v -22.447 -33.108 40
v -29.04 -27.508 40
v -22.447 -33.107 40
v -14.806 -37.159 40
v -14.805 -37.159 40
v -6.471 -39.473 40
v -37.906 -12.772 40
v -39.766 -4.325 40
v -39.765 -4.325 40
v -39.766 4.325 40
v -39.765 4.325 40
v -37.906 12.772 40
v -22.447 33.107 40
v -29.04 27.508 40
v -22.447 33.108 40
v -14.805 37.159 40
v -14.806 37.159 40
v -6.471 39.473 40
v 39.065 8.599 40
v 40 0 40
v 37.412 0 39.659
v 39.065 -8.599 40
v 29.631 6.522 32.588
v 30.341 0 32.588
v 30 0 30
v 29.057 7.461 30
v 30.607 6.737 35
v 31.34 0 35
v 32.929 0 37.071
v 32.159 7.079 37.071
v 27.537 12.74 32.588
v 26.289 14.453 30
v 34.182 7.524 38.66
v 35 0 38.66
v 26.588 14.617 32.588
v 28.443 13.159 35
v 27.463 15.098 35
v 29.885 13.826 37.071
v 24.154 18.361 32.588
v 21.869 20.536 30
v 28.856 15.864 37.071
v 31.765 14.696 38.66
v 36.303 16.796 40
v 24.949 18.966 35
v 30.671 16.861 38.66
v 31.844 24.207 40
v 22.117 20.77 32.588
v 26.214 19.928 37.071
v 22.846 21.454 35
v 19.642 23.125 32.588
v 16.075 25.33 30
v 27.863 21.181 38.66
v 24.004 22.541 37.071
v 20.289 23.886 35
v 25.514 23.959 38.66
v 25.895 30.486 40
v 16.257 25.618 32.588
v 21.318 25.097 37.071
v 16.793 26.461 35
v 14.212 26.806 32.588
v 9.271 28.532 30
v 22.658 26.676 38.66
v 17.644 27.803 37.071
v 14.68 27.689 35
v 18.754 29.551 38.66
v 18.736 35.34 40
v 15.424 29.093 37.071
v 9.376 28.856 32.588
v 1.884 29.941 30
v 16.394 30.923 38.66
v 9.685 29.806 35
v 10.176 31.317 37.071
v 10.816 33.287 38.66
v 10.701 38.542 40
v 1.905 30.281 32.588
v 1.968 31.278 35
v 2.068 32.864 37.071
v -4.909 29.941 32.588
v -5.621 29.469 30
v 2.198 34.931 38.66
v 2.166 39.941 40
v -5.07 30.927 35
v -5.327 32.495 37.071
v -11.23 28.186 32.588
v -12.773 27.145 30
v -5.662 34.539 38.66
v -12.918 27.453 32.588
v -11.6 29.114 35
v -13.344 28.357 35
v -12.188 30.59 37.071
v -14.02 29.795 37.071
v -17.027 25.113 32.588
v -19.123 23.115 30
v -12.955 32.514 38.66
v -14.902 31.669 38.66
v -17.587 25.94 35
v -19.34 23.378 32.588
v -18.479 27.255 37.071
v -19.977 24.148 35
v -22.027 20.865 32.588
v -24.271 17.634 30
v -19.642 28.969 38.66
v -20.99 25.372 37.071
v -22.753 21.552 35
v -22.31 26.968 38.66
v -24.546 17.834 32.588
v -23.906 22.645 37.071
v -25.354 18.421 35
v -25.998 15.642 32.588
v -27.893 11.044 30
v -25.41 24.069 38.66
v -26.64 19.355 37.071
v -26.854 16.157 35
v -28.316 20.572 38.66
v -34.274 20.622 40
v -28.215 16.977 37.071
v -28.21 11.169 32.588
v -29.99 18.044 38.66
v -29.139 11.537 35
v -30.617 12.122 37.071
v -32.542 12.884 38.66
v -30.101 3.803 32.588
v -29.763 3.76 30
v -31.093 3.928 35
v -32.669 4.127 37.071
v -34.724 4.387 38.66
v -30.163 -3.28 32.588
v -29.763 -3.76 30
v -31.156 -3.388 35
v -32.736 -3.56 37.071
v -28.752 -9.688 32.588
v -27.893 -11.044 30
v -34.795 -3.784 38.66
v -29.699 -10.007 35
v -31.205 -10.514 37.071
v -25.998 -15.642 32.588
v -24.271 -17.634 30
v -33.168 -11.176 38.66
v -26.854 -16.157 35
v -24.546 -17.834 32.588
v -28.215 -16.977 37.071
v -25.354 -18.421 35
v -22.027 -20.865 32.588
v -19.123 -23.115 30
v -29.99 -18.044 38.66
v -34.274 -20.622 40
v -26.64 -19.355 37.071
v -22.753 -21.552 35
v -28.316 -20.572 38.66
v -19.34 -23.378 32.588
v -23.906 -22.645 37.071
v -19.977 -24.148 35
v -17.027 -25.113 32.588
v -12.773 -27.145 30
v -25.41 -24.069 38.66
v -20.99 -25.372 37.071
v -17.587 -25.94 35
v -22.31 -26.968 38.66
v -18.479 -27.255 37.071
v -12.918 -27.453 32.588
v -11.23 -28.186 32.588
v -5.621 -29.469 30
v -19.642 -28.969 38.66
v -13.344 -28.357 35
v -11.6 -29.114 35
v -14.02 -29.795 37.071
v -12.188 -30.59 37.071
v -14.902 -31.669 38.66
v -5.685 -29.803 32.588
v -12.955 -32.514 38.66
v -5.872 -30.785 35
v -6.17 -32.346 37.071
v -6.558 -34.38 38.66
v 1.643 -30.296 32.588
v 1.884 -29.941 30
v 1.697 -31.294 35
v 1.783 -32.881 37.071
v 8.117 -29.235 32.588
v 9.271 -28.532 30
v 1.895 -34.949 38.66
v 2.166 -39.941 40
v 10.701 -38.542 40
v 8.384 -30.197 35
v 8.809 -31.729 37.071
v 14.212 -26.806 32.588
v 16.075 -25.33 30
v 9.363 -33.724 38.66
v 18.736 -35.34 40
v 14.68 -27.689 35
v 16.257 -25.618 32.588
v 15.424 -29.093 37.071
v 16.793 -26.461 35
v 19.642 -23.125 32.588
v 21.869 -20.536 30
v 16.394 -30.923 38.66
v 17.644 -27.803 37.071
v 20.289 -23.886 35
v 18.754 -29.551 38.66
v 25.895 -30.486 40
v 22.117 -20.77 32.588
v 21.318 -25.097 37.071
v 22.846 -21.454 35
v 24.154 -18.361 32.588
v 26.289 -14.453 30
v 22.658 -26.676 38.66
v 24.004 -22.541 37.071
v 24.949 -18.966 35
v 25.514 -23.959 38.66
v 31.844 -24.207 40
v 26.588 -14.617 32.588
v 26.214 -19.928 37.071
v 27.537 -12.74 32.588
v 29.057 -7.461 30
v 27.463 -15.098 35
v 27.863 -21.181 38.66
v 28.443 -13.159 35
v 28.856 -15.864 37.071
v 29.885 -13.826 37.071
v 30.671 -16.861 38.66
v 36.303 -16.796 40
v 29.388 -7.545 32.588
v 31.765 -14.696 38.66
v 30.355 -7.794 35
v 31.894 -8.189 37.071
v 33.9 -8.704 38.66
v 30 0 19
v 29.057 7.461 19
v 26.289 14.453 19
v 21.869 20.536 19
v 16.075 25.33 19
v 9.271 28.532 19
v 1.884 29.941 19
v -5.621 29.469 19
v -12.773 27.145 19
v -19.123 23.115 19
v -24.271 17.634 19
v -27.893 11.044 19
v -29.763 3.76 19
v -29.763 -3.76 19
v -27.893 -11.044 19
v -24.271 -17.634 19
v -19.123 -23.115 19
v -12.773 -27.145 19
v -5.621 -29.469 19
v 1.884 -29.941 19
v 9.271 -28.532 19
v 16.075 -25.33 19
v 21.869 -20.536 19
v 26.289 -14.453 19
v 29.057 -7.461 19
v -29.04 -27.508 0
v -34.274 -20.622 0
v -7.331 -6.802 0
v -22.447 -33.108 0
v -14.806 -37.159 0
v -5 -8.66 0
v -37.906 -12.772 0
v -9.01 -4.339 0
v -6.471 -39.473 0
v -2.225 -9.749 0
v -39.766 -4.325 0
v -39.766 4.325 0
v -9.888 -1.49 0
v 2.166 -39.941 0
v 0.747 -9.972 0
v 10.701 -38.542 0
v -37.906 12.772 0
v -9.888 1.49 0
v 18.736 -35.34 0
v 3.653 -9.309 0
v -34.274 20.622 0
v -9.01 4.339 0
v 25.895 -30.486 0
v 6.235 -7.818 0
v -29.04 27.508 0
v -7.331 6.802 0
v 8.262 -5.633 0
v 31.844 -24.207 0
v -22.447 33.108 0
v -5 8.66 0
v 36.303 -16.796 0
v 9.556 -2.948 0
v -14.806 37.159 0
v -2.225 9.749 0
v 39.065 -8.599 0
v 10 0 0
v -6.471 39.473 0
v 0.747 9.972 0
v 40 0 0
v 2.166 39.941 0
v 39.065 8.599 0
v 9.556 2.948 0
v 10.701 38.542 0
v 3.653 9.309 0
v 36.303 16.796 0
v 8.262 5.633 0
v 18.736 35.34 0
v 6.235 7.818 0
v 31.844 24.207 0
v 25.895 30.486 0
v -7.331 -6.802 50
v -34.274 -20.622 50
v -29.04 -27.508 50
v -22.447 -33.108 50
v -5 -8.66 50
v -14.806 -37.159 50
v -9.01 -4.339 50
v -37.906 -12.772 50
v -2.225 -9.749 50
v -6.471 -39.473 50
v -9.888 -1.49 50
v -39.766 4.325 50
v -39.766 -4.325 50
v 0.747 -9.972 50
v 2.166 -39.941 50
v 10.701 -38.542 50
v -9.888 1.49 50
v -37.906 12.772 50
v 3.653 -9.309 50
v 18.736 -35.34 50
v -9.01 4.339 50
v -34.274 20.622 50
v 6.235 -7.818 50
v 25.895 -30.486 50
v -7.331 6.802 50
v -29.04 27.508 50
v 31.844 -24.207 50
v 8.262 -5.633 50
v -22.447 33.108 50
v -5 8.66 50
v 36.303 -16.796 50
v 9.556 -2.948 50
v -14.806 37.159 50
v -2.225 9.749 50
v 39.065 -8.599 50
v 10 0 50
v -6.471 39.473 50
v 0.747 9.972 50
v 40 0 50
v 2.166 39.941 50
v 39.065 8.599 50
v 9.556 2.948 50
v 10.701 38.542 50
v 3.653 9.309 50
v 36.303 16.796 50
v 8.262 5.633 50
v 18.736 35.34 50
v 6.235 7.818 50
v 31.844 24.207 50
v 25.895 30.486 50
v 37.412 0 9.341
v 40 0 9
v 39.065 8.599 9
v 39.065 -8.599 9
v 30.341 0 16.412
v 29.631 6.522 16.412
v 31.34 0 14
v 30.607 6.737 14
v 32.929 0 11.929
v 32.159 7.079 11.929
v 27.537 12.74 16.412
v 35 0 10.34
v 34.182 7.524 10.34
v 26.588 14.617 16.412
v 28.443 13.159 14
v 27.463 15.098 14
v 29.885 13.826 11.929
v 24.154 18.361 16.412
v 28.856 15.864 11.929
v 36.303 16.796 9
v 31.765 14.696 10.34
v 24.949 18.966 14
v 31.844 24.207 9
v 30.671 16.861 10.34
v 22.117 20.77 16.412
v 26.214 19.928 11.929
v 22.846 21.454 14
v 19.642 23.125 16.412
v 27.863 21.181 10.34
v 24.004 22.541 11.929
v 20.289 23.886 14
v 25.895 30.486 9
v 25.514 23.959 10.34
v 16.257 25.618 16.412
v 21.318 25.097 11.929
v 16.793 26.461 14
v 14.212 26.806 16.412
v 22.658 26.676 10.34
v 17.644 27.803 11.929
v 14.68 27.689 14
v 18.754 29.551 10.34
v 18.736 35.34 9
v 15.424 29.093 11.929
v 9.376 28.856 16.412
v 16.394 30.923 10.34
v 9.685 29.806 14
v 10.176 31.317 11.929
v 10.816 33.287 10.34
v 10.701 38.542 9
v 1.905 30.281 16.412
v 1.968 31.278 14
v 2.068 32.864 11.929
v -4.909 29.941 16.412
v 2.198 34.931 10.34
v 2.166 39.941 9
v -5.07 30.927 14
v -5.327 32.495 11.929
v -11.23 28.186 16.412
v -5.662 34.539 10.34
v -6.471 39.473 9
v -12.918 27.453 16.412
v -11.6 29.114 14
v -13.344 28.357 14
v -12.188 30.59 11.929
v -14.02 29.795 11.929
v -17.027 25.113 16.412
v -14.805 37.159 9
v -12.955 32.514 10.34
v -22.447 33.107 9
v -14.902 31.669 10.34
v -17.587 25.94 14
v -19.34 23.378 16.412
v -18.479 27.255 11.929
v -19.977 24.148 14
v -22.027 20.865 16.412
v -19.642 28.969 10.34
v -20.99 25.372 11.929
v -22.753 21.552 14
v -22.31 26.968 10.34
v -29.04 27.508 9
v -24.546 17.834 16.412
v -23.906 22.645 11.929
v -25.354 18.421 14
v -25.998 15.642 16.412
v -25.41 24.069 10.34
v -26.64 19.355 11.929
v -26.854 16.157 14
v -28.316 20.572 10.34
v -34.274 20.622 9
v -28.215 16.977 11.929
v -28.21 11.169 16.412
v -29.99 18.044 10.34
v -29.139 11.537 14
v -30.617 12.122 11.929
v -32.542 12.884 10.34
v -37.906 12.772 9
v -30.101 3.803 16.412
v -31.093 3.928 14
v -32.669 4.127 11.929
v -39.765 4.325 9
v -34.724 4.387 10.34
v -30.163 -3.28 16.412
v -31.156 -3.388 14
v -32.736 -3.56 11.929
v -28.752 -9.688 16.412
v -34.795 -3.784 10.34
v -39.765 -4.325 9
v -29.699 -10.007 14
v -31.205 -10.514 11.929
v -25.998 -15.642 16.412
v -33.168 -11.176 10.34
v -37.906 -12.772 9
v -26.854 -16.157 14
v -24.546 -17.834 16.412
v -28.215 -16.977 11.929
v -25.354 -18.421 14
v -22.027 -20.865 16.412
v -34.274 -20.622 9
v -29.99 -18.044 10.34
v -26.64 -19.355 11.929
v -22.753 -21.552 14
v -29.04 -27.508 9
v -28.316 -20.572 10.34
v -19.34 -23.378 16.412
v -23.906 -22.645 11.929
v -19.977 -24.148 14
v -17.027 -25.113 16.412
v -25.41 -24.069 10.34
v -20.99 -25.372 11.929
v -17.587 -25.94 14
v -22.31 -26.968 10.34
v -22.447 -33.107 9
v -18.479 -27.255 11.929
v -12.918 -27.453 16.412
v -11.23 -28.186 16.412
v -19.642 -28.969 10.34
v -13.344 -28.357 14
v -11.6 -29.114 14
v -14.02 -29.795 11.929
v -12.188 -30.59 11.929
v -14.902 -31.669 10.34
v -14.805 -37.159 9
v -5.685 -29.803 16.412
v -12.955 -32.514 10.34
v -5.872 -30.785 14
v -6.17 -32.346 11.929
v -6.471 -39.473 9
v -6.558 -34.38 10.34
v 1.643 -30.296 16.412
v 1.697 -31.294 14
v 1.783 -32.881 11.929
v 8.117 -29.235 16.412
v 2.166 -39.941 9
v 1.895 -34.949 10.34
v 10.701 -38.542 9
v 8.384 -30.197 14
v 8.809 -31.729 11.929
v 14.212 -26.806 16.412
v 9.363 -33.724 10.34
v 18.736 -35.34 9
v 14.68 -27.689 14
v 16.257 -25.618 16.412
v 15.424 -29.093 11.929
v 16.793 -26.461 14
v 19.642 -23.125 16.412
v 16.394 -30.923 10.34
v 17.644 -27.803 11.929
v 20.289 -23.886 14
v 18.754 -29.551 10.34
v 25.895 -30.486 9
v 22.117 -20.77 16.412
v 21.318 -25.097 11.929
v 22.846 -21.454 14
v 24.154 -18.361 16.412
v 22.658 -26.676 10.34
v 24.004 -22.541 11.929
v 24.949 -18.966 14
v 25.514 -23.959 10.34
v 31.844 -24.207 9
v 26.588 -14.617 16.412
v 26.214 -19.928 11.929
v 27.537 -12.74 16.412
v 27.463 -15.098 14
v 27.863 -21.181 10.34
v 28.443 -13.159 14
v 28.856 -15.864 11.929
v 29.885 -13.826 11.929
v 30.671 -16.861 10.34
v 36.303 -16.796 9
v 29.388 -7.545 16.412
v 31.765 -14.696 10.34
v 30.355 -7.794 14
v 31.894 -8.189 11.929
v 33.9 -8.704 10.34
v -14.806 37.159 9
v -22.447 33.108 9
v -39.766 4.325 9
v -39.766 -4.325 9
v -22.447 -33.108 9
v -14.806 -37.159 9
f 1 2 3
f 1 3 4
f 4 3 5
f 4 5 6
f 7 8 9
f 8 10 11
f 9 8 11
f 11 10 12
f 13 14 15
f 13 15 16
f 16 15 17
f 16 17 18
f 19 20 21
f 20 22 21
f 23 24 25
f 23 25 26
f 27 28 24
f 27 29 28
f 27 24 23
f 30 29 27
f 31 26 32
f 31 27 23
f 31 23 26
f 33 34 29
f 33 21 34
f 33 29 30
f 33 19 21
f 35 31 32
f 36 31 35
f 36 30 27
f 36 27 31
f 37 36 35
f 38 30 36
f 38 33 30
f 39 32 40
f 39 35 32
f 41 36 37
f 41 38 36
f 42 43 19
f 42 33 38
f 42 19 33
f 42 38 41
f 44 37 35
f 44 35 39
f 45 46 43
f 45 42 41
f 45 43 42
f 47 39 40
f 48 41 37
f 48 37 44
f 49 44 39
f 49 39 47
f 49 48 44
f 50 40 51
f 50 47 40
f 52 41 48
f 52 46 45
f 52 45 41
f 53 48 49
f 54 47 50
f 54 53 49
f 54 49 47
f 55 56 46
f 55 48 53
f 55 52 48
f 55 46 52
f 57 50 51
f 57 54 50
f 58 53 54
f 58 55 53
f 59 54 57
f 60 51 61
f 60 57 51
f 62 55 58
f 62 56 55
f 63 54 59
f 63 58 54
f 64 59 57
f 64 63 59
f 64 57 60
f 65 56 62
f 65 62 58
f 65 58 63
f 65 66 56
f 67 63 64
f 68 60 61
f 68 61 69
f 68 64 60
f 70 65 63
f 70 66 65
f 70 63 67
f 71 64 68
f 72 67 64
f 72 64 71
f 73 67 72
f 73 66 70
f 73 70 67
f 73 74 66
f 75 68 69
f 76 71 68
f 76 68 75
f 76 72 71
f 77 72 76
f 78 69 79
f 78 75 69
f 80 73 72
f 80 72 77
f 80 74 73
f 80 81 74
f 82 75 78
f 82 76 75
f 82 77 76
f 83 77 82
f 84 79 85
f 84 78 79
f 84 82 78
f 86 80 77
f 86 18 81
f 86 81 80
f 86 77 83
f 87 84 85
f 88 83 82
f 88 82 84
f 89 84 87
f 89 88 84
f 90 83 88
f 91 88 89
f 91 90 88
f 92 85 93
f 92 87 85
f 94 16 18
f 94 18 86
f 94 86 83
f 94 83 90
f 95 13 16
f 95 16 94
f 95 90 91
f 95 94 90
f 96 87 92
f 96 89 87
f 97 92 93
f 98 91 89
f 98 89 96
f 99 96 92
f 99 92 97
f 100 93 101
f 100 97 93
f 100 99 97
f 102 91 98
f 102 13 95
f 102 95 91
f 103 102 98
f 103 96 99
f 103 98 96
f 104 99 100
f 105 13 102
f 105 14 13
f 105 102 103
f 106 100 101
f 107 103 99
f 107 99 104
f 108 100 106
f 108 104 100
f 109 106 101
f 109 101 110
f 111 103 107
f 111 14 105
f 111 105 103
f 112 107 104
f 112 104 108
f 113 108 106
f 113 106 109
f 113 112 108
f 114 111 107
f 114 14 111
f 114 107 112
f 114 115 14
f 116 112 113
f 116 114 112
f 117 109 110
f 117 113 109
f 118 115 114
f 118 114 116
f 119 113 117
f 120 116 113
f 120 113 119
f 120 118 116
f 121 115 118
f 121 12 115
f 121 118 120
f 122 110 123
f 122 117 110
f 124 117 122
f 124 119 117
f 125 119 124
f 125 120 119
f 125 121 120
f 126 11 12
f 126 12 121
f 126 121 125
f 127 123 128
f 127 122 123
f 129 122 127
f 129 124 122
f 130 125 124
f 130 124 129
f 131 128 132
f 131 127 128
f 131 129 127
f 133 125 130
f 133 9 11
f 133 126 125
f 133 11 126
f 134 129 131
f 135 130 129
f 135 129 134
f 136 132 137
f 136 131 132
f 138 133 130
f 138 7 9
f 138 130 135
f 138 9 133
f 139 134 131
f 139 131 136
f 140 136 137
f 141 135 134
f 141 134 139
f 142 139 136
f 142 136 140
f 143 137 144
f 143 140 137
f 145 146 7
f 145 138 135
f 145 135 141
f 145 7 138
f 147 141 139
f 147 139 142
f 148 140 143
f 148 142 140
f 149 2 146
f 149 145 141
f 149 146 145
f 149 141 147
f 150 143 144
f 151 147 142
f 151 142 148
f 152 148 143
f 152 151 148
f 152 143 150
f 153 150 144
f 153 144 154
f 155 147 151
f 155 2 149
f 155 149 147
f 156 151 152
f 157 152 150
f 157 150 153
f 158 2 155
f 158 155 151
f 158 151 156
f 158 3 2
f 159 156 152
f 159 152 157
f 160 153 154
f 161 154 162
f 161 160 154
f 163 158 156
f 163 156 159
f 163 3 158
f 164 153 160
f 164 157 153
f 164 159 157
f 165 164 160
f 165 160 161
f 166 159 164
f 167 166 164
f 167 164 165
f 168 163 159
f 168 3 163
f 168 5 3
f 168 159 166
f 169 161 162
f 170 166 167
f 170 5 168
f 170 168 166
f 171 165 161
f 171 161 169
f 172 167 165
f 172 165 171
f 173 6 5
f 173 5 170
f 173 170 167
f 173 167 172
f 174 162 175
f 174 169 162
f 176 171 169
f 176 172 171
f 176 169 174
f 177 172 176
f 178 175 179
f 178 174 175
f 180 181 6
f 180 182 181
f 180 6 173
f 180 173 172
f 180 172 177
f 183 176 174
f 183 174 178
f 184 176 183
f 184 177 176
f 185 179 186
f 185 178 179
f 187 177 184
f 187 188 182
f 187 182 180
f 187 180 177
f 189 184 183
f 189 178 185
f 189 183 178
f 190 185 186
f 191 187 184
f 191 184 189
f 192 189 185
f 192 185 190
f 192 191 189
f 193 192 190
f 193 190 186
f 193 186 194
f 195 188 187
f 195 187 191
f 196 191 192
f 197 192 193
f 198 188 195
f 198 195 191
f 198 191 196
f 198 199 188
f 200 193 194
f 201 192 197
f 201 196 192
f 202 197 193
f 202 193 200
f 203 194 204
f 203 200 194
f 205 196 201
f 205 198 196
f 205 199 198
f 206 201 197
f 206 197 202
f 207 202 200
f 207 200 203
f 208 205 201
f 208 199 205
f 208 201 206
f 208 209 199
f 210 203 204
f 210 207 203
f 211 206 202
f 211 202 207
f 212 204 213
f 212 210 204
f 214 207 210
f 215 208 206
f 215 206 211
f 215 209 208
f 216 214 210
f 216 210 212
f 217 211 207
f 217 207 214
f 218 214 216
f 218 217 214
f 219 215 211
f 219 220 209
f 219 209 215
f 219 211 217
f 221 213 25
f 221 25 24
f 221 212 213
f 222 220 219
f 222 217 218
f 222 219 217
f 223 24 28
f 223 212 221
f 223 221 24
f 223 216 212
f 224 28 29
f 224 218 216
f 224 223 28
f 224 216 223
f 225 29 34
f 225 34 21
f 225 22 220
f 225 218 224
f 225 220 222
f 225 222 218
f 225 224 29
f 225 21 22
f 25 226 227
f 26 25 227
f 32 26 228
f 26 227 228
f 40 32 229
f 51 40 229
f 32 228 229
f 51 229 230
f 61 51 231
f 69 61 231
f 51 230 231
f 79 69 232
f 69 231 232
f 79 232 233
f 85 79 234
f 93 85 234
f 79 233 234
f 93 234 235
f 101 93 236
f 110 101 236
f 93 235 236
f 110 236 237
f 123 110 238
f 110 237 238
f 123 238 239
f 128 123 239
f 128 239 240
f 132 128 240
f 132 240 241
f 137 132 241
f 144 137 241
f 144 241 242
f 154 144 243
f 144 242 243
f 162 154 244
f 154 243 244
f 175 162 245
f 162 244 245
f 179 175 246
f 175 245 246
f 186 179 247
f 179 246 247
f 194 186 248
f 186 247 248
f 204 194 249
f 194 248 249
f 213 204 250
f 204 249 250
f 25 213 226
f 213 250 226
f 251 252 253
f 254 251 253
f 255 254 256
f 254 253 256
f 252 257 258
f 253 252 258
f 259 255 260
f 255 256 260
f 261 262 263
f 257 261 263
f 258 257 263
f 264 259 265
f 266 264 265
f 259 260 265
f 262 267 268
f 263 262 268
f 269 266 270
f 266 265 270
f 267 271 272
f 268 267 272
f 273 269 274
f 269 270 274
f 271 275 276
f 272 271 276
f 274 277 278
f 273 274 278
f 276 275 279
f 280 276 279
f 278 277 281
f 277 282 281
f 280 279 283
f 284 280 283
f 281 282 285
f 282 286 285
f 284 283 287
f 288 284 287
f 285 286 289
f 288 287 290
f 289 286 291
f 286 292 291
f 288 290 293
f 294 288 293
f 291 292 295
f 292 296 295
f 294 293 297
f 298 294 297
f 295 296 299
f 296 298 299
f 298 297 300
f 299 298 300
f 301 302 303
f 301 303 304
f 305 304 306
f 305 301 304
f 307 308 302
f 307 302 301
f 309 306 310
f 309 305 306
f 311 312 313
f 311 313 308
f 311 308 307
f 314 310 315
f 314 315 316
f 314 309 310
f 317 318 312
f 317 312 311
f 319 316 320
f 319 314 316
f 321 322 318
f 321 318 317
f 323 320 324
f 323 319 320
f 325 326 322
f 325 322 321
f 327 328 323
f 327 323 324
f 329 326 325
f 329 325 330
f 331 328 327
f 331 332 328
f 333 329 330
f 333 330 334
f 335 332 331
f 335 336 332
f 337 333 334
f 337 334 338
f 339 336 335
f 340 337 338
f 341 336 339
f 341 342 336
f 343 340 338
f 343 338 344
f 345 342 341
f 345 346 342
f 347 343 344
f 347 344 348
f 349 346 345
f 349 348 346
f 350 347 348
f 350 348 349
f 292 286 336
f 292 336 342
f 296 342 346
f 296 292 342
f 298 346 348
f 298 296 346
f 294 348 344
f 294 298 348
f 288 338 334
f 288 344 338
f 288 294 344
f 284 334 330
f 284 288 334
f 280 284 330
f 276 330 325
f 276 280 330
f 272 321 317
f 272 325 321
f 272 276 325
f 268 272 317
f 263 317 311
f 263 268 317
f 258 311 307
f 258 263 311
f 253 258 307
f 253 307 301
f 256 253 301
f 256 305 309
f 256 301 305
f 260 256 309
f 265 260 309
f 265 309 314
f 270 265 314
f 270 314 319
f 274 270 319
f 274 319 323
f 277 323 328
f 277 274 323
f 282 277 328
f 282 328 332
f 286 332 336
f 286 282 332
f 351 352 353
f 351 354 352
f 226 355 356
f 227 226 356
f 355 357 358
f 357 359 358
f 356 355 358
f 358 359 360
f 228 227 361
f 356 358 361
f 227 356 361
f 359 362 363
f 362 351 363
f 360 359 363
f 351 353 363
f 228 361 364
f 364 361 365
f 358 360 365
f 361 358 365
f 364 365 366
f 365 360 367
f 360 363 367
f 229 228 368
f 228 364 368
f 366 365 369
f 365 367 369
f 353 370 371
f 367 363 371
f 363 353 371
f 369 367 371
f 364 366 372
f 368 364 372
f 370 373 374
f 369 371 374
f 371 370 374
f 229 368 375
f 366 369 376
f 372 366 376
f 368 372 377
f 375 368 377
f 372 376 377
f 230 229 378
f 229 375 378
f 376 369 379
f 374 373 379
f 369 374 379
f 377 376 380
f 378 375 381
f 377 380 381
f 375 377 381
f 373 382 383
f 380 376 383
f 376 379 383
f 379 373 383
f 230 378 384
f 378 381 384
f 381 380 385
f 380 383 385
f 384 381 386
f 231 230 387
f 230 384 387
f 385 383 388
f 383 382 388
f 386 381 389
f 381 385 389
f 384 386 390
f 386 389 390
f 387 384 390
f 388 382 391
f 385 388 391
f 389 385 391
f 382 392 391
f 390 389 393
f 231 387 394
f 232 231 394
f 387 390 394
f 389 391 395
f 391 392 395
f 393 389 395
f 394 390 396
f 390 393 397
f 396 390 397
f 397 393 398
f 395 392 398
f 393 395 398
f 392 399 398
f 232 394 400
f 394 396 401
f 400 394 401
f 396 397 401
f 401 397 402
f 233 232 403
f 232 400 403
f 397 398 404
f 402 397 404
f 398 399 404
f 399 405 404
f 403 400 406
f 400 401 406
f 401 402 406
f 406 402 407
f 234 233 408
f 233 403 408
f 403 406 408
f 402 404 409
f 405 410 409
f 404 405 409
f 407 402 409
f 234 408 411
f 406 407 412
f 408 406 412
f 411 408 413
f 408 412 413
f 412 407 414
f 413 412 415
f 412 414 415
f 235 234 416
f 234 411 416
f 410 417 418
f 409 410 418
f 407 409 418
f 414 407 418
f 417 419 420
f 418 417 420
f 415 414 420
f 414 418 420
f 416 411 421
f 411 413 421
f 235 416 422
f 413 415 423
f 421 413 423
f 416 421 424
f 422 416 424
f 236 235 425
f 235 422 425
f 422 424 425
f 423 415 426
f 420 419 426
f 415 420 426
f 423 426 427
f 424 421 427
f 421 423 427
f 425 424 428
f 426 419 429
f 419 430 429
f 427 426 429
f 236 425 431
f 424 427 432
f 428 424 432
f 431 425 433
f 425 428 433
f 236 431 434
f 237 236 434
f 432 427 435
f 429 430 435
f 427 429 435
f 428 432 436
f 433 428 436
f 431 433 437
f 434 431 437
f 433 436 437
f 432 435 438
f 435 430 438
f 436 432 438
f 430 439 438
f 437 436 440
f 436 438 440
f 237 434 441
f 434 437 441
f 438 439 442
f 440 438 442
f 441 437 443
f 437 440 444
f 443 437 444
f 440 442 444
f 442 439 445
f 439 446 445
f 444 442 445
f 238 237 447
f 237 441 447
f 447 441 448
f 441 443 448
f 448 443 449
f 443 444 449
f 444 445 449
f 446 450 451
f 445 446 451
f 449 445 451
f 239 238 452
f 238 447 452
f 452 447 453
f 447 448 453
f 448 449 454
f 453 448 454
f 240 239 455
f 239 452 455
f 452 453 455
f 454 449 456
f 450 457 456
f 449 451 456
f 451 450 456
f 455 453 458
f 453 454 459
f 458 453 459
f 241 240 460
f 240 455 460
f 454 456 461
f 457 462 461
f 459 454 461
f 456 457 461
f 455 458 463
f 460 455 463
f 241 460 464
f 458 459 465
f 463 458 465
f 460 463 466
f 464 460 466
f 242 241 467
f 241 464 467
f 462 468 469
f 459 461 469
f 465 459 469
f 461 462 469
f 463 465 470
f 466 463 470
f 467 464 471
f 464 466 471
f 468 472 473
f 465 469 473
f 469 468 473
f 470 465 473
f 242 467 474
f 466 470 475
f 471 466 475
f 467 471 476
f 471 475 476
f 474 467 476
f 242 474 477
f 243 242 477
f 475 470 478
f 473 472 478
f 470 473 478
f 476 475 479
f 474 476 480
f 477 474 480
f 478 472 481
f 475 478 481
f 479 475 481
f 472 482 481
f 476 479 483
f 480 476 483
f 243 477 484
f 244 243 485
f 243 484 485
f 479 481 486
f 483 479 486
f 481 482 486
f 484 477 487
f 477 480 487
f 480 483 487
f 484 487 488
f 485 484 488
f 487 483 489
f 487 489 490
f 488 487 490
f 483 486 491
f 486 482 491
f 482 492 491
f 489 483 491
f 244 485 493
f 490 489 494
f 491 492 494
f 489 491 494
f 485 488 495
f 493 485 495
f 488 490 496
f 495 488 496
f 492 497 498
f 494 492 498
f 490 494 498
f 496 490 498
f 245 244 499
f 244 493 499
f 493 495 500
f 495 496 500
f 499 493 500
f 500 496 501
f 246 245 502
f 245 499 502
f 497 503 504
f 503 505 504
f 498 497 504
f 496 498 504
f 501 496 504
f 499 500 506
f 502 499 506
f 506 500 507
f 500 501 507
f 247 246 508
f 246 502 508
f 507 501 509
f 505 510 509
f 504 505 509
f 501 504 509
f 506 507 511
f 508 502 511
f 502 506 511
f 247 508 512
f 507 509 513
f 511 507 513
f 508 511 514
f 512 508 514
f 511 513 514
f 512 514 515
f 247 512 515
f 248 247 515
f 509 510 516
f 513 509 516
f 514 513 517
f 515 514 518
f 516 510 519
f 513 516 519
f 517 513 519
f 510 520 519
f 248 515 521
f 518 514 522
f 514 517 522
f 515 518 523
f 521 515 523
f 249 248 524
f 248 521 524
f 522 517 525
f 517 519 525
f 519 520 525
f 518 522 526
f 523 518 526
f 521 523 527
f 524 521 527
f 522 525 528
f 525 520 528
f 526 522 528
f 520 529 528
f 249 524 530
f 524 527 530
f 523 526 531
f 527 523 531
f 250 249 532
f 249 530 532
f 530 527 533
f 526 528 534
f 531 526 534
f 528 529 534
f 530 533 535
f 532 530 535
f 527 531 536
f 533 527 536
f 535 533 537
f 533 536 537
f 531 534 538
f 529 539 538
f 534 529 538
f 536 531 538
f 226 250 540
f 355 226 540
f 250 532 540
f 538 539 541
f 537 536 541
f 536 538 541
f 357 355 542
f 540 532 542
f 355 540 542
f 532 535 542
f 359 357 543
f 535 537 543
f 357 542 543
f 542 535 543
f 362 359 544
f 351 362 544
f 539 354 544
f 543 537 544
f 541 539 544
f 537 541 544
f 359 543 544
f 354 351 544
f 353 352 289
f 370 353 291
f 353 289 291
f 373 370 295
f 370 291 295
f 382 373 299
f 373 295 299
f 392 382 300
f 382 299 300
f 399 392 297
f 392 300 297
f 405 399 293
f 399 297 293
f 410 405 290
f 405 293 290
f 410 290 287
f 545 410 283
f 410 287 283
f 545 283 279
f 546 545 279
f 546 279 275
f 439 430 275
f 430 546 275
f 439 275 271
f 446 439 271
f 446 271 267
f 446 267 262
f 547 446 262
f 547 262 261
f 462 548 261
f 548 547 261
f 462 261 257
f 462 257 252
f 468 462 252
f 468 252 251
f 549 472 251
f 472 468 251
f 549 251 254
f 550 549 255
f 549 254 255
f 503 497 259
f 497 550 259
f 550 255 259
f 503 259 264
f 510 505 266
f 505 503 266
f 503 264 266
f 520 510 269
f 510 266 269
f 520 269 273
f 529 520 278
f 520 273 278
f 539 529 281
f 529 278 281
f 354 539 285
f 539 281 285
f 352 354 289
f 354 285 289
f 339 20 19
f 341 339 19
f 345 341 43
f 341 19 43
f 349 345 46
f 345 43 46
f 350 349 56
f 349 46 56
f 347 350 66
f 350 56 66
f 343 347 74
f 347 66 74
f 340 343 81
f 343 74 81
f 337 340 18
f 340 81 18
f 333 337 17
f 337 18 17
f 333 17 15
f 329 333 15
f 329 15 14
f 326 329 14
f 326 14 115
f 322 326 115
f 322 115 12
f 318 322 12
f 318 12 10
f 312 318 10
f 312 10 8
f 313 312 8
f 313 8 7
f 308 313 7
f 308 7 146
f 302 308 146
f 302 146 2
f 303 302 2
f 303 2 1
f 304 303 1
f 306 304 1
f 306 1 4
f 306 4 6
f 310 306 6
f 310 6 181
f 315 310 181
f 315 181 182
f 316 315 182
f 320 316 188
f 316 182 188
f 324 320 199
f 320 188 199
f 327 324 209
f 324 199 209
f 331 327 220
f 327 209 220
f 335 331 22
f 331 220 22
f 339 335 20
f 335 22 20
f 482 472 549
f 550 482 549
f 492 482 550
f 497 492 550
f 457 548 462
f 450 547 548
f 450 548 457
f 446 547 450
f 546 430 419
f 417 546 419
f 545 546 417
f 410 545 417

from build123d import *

# Parameters (mm, degrees)
SKETCH_1_R               = 40
EXTRUDE_1_DEPTH          = 50
CUT_EXTRUDE_1_DEPTH      = 15
CUT_EXTRUDE_1_DEPTH_BACK = 16
SKETCH_2_OUTSIDE_W       = 106.738
SKETCH_2_OUTSIDE_H       = 106.738
SKETCH_2_OUTSIDE_R       = 30
FILLET_1_R               = 10
FILLET_2_R               = 10
CUT_EXTRUDE_2_DEPTH      = 62.846584384
CUT_EXTRUDE_2_DEPTH_BACK = 62.846584384
SKETCH_3_R               = 10


with BuildPart() as part:
    # 草图1 → 凸台-拉伸1 (new body)
    with BuildSketch(Plane.XY):
        Circle(SKETCH_1_R)
    extrude(amount=EXTRUDE_1_DEPTH)

    # 草图2 outside → 切除-拉伸1 (cut, two sides: drawn at the far end of the back side and taken through both)
    with BuildSketch(Plane.XY.offset(25).offset(-CUT_EXTRUDE_1_DEPTH_BACK)):
        Rectangle(SKETCH_2_OUTSIDE_W, SKETCH_2_OUTSIDE_H)
        Circle(SKETCH_2_OUTSIDE_R, mode=Mode.SUBTRACT)
    extrude(amount=CUT_EXTRUDE_1_DEPTH + CUT_EXTRUDE_1_DEPTH_BACK, mode=Mode.SUBTRACT)

    # 圆角1
    fillet_1_edges = [part.edges().sort_by_distance(p)[0] for p in [
        (-30, 0, 40),
    ]]
    fillet(fillet_1_edges, radius=FILLET_1_R - 0.0001)  # a hair under: the kernel refuses the full size

    # 圆角2
    fillet_2_edges = [part.edges().sort_by_distance(p)[0] for p in [
        (-30, 0, 9),
    ]]
    fillet(fillet_2_edges, radius=FILLET_2_R - 0.0001)  # a hair under: the kernel refuses the full size

    # 草图3 → 切除-拉伸2 (cut, two sides: drawn at the far end of the back side and taken through both)
    with BuildSketch(Plane.XY.offset(25).offset(-CUT_EXTRUDE_2_DEPTH_BACK)):
        Circle(SKETCH_3_R)
    extrude(amount=CUT_EXTRUDE_2_DEPTH + CUT_EXTRUDE_2_DEPTH_BACK, mode=Mode.SUBTRACT)


solid = part.part
